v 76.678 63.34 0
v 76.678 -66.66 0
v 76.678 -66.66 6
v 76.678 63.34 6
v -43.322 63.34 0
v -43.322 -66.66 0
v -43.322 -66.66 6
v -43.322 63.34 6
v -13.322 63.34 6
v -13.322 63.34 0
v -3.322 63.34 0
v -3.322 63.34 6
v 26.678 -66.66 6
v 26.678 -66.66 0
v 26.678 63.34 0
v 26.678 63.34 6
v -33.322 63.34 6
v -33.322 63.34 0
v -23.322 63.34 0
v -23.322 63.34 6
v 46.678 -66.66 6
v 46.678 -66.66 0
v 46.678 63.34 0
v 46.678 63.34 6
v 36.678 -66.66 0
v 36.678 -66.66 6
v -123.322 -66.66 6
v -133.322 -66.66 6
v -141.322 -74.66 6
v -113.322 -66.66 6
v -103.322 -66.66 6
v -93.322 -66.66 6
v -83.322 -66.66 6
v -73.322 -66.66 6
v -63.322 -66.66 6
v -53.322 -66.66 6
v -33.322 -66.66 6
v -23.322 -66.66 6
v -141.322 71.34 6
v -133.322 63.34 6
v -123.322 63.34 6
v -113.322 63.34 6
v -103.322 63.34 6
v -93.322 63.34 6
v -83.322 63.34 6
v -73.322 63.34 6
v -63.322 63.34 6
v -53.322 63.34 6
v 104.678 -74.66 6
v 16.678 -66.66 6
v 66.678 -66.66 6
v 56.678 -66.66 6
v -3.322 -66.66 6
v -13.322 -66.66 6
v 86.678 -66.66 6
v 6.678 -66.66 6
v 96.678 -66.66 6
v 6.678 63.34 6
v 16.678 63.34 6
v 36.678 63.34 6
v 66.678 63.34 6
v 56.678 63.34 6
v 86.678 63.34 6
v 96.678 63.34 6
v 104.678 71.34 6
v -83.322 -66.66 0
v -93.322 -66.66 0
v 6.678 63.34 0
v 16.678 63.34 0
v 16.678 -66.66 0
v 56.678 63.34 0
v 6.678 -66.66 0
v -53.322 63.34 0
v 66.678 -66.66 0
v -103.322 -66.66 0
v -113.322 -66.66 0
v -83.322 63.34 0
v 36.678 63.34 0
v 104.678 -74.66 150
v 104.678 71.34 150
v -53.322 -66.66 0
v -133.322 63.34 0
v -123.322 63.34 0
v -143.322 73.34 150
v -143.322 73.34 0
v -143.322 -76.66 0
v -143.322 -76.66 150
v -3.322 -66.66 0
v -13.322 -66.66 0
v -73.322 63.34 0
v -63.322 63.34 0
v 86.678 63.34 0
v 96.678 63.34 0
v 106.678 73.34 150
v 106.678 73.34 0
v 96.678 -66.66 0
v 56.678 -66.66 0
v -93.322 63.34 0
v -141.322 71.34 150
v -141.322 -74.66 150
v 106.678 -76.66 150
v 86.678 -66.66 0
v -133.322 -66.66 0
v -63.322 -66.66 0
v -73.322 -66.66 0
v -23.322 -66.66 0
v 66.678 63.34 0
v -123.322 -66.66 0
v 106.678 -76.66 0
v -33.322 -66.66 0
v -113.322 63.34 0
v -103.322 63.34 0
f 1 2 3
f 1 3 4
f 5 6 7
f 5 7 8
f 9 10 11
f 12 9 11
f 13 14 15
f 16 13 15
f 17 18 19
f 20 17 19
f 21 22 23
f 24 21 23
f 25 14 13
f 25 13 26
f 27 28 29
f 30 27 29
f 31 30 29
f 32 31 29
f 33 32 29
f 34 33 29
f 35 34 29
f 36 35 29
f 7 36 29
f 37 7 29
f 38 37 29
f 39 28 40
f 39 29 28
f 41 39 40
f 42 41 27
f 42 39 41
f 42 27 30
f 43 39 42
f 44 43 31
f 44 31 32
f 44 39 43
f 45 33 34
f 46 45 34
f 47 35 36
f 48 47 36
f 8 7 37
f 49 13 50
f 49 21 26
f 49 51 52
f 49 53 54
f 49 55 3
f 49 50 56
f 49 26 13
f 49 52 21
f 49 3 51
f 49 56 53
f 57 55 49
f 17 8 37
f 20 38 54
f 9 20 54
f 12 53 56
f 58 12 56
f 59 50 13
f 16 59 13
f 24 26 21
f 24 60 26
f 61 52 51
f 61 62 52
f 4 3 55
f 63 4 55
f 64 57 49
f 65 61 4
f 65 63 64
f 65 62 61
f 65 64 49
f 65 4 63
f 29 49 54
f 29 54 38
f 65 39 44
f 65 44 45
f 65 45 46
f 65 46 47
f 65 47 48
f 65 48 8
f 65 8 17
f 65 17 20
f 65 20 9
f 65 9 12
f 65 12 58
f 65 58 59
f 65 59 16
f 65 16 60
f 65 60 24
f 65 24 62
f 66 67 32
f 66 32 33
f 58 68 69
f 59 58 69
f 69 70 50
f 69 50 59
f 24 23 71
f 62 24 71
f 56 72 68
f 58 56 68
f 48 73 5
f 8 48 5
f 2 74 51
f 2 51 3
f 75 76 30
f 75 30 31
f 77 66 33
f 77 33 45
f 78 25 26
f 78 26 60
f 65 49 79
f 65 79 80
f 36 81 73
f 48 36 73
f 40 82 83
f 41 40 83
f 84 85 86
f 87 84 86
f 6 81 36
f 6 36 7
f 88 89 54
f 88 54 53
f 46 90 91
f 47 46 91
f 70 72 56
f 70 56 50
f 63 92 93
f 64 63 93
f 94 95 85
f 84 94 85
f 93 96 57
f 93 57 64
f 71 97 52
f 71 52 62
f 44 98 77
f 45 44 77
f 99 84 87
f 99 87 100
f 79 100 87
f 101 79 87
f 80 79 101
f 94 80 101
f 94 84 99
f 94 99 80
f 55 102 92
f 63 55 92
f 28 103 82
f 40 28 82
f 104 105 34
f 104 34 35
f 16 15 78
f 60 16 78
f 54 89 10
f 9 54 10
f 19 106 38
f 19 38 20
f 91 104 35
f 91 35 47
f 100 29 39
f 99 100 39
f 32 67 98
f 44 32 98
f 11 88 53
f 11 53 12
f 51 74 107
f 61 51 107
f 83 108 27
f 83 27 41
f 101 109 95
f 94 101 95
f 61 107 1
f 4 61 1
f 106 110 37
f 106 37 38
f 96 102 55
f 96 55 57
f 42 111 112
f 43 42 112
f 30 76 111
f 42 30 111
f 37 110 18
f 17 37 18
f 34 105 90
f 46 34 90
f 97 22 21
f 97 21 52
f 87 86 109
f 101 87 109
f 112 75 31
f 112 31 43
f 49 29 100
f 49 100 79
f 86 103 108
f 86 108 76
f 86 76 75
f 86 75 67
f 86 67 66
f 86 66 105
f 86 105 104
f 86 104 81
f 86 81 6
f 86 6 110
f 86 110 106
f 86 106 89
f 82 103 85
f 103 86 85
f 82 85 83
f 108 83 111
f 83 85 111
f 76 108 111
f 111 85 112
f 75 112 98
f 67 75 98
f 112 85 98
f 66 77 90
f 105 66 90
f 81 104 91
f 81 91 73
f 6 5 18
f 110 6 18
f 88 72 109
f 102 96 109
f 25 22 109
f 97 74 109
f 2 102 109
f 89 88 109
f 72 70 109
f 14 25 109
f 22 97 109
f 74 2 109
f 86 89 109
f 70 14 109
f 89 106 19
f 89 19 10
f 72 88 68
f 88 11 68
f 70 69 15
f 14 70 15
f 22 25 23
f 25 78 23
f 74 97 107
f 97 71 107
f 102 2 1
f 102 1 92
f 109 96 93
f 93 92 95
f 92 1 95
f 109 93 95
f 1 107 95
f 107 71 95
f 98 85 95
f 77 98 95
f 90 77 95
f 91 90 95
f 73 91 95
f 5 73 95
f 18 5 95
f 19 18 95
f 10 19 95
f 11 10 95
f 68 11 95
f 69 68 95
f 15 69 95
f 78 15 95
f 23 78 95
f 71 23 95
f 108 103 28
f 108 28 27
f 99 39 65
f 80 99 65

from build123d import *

# Parameters (mm, degrees)
F1_W     = 246
F1_H     = 146
F1_W_2   = 10
F1_H_2   = 130
F2_DEPTH = 6
F3_DEPTH = 150


# Not quite as in the source:
# - ends of sketch curves that miss each other by under 0.0002 mm in the source are joined


with BuildPart() as f2:
    # F1 (on face) → F2 (new body)
    with BuildSketch(Plane.XY):
        with Locations((-18.3215842792, -1.6598337144)):
            Rectangle(F1_W, F1_H)
        with Locations((-128.3215842792, -1.6598337144)):
            Rectangle(F1_W_2, F1_H_2, mode=Mode.SUBTRACT)
        with Locations((-108.3215842792, -1.6598337144)):
            Rectangle(F1_W_2, F1_H_2, mode=Mode.SUBTRACT)
        with Locations((-88.3215842792, -1.6598337144)):
            Rectangle(F1_W_2, F1_H_2, mode=Mode.SUBTRACT)
        with Locations((-68.3215842792, -1.6598337144)):
            Rectangle(F1_W_2, F1_H_2, mode=Mode.SUBTRACT)
        with Locations((-48.3215842792, -1.6598337144)):
            Rectangle(F1_W_2, F1_H_2, mode=Mode.SUBTRACT)
        with Locations((-28.3215842792, -1.6598337144)):
            Rectangle(F1_W_2, F1_H_2, mode=Mode.SUBTRACT)
        with Locations((-8.3215842792, -1.6598337144)):
            Rectangle(F1_W_2, F1_H_2, mode=Mode.SUBTRACT)
        with Locations((11.6784157208, -1.6598337144)):
            Rectangle(F1_W_2, F1_H_2, mode=Mode.SUBTRACT)
        with Locations((31.6784157208, -1.6598337144)):
            Rectangle(F1_W_2, F1_H_2, mode=Mode.SUBTRACT)
        with Locations((51.6784157208, -1.6598337144)):
            Rectangle(F1_W_2, F1_H_2, mode=Mode.SUBTRACT)
        with Locations((71.6784157208, -1.6598337144)):
            Rectangle(F1_W_2, F1_H_2, mode=Mode.SUBTRACT)
        with Locations((91.6784157208, -1.6598337144)):
            Rectangle(F1_W_2, F1_H_2, mode=Mode.SUBTRACT)
    extrude(amount=F2_DEPTH)

    # F1 (on face) → F3 (join)
    with BuildSketch(Plane.XY):
        Polygon((106.6783964634, -76.6597911716), (106.6783964634, 73.3401662856), (-143.3215842792, 73.3401662856), (-143.3215842792, -76.6598337144), align=None)
        with Locations((-18.3215842792, -1.6598337144)):
            Rectangle(F1_W, F1_H, mode=Mode.SUBTRACT)
    extrude(amount=F3_DEPTH)


solid = f2.part
